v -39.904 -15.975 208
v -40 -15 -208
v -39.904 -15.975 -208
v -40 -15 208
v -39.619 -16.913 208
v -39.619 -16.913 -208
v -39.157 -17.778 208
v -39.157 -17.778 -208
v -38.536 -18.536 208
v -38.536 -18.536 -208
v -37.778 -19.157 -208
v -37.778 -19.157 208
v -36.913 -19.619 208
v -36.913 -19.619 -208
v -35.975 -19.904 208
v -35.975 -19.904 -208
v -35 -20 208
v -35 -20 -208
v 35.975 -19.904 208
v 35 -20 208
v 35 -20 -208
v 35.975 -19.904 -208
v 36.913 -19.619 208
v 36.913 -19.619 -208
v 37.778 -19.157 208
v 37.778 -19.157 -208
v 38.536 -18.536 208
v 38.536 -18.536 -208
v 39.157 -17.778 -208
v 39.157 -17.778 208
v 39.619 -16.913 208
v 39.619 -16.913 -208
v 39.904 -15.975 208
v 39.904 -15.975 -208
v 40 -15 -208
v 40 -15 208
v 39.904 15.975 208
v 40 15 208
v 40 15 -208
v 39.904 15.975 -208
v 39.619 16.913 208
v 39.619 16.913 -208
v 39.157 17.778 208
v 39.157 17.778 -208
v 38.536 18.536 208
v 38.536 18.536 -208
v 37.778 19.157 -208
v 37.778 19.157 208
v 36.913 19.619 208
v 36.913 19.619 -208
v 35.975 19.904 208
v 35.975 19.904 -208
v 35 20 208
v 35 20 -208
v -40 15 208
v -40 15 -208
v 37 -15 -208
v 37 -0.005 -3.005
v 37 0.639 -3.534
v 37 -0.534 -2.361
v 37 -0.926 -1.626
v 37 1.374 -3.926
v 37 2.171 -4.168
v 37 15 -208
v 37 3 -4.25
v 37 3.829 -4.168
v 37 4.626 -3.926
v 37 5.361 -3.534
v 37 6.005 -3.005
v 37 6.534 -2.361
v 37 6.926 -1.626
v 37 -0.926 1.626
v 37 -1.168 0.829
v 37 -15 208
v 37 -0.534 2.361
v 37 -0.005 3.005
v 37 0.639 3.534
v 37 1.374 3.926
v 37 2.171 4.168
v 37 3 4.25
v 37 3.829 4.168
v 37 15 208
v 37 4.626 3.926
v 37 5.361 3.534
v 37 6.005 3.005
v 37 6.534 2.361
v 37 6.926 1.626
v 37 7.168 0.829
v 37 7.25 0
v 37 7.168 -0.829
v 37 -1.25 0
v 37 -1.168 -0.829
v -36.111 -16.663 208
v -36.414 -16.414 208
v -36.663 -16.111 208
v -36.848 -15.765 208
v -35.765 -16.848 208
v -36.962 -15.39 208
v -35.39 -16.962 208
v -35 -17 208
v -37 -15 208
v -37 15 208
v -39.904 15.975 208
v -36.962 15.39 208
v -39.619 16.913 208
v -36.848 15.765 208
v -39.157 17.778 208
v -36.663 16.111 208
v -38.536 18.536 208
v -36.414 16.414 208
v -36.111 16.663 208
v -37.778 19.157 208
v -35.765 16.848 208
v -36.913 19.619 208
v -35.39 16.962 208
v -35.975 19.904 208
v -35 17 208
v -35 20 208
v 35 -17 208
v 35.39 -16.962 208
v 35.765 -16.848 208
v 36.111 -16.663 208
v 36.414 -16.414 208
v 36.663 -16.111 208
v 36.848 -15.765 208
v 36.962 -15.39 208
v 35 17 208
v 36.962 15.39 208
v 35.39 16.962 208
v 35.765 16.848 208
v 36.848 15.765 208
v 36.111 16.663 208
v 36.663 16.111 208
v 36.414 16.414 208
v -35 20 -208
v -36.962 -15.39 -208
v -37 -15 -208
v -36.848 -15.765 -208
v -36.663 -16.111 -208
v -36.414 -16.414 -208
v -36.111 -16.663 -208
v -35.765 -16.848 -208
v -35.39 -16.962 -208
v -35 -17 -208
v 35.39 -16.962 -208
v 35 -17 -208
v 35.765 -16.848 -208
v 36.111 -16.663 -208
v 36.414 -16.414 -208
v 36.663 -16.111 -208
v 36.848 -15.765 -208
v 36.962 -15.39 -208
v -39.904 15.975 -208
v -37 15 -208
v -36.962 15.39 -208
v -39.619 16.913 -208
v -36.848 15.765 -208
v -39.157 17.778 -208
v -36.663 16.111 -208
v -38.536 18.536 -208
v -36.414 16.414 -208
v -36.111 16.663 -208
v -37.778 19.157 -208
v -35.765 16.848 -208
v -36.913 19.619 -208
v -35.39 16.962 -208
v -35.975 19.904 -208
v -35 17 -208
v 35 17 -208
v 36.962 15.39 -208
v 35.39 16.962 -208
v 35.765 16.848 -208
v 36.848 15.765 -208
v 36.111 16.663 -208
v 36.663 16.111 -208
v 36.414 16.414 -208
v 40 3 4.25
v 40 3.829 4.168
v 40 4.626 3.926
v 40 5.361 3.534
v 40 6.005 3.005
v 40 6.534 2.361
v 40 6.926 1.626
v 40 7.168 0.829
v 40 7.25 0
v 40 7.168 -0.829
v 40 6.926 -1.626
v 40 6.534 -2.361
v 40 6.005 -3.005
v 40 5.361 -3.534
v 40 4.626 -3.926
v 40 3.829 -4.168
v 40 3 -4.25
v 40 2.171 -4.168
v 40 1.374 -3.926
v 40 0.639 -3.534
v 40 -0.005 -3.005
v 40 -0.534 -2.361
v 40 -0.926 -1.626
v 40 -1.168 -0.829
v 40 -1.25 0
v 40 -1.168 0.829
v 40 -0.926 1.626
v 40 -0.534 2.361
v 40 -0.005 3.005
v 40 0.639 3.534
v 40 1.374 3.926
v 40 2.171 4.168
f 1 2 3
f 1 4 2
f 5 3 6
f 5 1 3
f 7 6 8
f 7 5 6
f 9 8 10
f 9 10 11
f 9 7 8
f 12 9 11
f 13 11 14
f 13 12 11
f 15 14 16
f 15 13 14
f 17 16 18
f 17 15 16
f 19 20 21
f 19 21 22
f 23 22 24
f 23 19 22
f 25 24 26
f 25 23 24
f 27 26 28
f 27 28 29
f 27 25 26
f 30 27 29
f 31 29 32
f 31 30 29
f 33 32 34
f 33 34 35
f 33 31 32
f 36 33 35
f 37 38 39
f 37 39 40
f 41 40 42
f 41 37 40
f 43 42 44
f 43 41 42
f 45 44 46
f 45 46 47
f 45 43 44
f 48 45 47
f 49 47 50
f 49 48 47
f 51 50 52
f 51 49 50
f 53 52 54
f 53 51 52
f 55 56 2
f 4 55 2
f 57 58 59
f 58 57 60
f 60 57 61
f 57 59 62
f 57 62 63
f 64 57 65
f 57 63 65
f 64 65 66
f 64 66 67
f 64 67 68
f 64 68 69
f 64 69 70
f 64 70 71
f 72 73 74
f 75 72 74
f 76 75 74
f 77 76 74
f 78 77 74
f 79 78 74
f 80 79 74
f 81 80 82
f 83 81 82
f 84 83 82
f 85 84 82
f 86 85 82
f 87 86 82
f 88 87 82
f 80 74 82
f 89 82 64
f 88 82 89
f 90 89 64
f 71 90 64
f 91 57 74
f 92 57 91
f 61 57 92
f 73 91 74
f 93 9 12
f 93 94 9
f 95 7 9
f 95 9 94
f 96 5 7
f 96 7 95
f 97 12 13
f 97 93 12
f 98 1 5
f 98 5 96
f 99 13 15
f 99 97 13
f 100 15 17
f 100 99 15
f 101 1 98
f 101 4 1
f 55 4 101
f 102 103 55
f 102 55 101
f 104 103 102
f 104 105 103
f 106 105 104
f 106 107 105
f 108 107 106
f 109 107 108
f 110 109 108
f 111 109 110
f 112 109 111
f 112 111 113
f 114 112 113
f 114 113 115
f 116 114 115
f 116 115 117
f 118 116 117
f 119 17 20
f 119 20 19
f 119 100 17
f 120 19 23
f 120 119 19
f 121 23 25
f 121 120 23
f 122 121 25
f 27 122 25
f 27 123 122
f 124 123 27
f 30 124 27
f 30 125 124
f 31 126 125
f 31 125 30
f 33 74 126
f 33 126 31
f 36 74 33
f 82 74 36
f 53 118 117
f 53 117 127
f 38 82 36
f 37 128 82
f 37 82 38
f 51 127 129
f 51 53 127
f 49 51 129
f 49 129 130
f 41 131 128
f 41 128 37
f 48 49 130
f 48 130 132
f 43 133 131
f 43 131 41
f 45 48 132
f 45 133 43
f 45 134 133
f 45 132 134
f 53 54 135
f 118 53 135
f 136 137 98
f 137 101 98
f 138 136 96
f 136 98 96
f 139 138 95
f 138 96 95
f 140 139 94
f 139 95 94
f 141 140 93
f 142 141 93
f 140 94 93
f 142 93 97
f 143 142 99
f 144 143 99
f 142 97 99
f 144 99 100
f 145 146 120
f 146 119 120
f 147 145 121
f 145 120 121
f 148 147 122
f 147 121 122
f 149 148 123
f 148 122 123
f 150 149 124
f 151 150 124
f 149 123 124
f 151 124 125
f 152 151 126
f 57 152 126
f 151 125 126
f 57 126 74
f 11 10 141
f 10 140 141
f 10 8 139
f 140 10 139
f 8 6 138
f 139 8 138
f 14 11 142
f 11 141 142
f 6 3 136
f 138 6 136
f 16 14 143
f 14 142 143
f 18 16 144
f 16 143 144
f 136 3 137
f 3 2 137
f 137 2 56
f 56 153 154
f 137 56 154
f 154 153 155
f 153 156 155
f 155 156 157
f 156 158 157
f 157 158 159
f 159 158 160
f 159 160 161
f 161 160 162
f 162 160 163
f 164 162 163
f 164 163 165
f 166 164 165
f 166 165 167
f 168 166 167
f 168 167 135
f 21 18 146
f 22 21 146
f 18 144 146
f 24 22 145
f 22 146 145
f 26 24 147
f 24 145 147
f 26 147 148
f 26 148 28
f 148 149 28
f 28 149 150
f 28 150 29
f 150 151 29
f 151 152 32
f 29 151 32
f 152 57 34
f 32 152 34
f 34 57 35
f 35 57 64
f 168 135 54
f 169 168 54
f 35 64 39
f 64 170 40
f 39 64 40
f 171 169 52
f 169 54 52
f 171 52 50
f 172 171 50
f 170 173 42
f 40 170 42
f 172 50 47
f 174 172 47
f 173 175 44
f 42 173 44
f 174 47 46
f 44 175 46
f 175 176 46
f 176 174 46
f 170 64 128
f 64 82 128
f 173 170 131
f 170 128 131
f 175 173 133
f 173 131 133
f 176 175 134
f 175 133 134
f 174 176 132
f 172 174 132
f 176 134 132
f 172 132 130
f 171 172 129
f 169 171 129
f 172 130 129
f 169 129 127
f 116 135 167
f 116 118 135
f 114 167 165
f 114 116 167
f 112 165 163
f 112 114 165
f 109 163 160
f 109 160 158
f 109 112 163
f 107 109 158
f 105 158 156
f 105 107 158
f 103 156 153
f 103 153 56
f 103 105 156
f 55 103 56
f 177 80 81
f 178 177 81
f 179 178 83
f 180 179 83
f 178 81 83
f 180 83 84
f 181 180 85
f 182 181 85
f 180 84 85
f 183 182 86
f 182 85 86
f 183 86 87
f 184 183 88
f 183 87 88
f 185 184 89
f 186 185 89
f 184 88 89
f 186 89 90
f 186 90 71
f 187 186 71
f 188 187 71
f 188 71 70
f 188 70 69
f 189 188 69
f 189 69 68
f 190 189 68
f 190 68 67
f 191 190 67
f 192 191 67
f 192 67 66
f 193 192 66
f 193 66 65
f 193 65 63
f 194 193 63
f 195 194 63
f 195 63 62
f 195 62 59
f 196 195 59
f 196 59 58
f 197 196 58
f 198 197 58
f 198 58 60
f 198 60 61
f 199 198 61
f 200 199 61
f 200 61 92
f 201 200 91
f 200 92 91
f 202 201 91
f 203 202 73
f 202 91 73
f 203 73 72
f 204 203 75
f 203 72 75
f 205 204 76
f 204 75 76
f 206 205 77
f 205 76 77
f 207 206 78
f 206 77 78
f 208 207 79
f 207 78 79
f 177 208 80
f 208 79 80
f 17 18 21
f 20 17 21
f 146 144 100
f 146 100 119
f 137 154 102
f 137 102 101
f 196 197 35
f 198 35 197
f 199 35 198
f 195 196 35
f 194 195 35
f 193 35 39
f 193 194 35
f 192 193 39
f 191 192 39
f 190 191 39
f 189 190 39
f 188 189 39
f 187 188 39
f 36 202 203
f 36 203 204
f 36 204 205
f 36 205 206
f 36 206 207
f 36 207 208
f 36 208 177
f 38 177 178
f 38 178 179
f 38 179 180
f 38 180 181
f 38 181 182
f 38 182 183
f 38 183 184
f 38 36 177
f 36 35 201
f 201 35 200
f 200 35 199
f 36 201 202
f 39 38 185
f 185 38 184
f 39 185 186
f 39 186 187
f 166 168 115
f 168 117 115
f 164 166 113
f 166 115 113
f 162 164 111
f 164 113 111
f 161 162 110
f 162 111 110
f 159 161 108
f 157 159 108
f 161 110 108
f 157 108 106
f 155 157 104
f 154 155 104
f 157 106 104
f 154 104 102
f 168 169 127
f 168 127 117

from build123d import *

# Parameters (mm, degrees)
EXTRUDE_1_DEPTH        = 208
HOLE_WIZARD_M101_D     = 8.5
HOLE_WIZARD_M101_DEPTH = 27.5
HOLE_WIZARD_M101_TIP   = 2.553657631


with BuildPart() as part:
    # Эскиз1 → Бобышка-Вытянуть1 (new, symmetric)
    with BuildSketch(Plane.XY):
        with BuildLine():
            Line((-35, -20), (35, -20))
            ThreePointArc((35, -20), (38.535533906, -18.535533906), (40, -15))
            Line((40, -15), (40, 15))
            ThreePointArc((40, 15), (38.535533906, 18.535533906), (35, 20))
            Line((35, 20), (-35, 20))
            ThreePointArc((-35, 20), (-38.535533906, 18.535533906), (-40, 15))
            Line((-40, 15), (-40, -15))
            ThreePointArc((-40, -15), (-38.535533906, -18.535533906), (-35, -20))
        make_face()
        with BuildLine():
            Line((-35, -17), (35, -17))
            ThreePointArc((35, -17), (36.414213562, -16.414213562), (37, -15))
            Line((37, -15), (37, 15))
            ThreePointArc((37, 15), (36.414213562, 16.414213562), (35, 17))
            Line((35, 17), (-35, 17))
            ThreePointArc((-35, 17), (-36.414213562, 16.414213562), (-37, 15))
            Line((-37, 15), (-37, -15))
            ThreePointArc((-37, -15), (-36.414213562, -16.414213562), (-35, -17))
        make_face(mode=Mode.SUBTRACT)
    extrude(amount=EXTRUDE_1_DEPTH, both=True)

    # Отверстие обработанное метчиком M101
    with Locations(Plane(origin=(40, 0, 0), x_dir=(0, 0, -1), z_dir=(1, 0, 0))):
        with Locations((400, 3), (0, 3), (-400, 3)):
            Hole(HOLE_WIZARD_M101_D / 2, depth=HOLE_WIZARD_M101_DEPTH)
            with Locations((0, 0, -(HOLE_WIZARD_M101_DEPTH + HOLE_WIZARD_M101_TIP / 2))):  # 118° drill point
                Cone(0, HOLE_WIZARD_M101_D / 2, HOLE_WIZARD_M101_TIP, mode=Mode.SUBTRACT)


solid = part.part
